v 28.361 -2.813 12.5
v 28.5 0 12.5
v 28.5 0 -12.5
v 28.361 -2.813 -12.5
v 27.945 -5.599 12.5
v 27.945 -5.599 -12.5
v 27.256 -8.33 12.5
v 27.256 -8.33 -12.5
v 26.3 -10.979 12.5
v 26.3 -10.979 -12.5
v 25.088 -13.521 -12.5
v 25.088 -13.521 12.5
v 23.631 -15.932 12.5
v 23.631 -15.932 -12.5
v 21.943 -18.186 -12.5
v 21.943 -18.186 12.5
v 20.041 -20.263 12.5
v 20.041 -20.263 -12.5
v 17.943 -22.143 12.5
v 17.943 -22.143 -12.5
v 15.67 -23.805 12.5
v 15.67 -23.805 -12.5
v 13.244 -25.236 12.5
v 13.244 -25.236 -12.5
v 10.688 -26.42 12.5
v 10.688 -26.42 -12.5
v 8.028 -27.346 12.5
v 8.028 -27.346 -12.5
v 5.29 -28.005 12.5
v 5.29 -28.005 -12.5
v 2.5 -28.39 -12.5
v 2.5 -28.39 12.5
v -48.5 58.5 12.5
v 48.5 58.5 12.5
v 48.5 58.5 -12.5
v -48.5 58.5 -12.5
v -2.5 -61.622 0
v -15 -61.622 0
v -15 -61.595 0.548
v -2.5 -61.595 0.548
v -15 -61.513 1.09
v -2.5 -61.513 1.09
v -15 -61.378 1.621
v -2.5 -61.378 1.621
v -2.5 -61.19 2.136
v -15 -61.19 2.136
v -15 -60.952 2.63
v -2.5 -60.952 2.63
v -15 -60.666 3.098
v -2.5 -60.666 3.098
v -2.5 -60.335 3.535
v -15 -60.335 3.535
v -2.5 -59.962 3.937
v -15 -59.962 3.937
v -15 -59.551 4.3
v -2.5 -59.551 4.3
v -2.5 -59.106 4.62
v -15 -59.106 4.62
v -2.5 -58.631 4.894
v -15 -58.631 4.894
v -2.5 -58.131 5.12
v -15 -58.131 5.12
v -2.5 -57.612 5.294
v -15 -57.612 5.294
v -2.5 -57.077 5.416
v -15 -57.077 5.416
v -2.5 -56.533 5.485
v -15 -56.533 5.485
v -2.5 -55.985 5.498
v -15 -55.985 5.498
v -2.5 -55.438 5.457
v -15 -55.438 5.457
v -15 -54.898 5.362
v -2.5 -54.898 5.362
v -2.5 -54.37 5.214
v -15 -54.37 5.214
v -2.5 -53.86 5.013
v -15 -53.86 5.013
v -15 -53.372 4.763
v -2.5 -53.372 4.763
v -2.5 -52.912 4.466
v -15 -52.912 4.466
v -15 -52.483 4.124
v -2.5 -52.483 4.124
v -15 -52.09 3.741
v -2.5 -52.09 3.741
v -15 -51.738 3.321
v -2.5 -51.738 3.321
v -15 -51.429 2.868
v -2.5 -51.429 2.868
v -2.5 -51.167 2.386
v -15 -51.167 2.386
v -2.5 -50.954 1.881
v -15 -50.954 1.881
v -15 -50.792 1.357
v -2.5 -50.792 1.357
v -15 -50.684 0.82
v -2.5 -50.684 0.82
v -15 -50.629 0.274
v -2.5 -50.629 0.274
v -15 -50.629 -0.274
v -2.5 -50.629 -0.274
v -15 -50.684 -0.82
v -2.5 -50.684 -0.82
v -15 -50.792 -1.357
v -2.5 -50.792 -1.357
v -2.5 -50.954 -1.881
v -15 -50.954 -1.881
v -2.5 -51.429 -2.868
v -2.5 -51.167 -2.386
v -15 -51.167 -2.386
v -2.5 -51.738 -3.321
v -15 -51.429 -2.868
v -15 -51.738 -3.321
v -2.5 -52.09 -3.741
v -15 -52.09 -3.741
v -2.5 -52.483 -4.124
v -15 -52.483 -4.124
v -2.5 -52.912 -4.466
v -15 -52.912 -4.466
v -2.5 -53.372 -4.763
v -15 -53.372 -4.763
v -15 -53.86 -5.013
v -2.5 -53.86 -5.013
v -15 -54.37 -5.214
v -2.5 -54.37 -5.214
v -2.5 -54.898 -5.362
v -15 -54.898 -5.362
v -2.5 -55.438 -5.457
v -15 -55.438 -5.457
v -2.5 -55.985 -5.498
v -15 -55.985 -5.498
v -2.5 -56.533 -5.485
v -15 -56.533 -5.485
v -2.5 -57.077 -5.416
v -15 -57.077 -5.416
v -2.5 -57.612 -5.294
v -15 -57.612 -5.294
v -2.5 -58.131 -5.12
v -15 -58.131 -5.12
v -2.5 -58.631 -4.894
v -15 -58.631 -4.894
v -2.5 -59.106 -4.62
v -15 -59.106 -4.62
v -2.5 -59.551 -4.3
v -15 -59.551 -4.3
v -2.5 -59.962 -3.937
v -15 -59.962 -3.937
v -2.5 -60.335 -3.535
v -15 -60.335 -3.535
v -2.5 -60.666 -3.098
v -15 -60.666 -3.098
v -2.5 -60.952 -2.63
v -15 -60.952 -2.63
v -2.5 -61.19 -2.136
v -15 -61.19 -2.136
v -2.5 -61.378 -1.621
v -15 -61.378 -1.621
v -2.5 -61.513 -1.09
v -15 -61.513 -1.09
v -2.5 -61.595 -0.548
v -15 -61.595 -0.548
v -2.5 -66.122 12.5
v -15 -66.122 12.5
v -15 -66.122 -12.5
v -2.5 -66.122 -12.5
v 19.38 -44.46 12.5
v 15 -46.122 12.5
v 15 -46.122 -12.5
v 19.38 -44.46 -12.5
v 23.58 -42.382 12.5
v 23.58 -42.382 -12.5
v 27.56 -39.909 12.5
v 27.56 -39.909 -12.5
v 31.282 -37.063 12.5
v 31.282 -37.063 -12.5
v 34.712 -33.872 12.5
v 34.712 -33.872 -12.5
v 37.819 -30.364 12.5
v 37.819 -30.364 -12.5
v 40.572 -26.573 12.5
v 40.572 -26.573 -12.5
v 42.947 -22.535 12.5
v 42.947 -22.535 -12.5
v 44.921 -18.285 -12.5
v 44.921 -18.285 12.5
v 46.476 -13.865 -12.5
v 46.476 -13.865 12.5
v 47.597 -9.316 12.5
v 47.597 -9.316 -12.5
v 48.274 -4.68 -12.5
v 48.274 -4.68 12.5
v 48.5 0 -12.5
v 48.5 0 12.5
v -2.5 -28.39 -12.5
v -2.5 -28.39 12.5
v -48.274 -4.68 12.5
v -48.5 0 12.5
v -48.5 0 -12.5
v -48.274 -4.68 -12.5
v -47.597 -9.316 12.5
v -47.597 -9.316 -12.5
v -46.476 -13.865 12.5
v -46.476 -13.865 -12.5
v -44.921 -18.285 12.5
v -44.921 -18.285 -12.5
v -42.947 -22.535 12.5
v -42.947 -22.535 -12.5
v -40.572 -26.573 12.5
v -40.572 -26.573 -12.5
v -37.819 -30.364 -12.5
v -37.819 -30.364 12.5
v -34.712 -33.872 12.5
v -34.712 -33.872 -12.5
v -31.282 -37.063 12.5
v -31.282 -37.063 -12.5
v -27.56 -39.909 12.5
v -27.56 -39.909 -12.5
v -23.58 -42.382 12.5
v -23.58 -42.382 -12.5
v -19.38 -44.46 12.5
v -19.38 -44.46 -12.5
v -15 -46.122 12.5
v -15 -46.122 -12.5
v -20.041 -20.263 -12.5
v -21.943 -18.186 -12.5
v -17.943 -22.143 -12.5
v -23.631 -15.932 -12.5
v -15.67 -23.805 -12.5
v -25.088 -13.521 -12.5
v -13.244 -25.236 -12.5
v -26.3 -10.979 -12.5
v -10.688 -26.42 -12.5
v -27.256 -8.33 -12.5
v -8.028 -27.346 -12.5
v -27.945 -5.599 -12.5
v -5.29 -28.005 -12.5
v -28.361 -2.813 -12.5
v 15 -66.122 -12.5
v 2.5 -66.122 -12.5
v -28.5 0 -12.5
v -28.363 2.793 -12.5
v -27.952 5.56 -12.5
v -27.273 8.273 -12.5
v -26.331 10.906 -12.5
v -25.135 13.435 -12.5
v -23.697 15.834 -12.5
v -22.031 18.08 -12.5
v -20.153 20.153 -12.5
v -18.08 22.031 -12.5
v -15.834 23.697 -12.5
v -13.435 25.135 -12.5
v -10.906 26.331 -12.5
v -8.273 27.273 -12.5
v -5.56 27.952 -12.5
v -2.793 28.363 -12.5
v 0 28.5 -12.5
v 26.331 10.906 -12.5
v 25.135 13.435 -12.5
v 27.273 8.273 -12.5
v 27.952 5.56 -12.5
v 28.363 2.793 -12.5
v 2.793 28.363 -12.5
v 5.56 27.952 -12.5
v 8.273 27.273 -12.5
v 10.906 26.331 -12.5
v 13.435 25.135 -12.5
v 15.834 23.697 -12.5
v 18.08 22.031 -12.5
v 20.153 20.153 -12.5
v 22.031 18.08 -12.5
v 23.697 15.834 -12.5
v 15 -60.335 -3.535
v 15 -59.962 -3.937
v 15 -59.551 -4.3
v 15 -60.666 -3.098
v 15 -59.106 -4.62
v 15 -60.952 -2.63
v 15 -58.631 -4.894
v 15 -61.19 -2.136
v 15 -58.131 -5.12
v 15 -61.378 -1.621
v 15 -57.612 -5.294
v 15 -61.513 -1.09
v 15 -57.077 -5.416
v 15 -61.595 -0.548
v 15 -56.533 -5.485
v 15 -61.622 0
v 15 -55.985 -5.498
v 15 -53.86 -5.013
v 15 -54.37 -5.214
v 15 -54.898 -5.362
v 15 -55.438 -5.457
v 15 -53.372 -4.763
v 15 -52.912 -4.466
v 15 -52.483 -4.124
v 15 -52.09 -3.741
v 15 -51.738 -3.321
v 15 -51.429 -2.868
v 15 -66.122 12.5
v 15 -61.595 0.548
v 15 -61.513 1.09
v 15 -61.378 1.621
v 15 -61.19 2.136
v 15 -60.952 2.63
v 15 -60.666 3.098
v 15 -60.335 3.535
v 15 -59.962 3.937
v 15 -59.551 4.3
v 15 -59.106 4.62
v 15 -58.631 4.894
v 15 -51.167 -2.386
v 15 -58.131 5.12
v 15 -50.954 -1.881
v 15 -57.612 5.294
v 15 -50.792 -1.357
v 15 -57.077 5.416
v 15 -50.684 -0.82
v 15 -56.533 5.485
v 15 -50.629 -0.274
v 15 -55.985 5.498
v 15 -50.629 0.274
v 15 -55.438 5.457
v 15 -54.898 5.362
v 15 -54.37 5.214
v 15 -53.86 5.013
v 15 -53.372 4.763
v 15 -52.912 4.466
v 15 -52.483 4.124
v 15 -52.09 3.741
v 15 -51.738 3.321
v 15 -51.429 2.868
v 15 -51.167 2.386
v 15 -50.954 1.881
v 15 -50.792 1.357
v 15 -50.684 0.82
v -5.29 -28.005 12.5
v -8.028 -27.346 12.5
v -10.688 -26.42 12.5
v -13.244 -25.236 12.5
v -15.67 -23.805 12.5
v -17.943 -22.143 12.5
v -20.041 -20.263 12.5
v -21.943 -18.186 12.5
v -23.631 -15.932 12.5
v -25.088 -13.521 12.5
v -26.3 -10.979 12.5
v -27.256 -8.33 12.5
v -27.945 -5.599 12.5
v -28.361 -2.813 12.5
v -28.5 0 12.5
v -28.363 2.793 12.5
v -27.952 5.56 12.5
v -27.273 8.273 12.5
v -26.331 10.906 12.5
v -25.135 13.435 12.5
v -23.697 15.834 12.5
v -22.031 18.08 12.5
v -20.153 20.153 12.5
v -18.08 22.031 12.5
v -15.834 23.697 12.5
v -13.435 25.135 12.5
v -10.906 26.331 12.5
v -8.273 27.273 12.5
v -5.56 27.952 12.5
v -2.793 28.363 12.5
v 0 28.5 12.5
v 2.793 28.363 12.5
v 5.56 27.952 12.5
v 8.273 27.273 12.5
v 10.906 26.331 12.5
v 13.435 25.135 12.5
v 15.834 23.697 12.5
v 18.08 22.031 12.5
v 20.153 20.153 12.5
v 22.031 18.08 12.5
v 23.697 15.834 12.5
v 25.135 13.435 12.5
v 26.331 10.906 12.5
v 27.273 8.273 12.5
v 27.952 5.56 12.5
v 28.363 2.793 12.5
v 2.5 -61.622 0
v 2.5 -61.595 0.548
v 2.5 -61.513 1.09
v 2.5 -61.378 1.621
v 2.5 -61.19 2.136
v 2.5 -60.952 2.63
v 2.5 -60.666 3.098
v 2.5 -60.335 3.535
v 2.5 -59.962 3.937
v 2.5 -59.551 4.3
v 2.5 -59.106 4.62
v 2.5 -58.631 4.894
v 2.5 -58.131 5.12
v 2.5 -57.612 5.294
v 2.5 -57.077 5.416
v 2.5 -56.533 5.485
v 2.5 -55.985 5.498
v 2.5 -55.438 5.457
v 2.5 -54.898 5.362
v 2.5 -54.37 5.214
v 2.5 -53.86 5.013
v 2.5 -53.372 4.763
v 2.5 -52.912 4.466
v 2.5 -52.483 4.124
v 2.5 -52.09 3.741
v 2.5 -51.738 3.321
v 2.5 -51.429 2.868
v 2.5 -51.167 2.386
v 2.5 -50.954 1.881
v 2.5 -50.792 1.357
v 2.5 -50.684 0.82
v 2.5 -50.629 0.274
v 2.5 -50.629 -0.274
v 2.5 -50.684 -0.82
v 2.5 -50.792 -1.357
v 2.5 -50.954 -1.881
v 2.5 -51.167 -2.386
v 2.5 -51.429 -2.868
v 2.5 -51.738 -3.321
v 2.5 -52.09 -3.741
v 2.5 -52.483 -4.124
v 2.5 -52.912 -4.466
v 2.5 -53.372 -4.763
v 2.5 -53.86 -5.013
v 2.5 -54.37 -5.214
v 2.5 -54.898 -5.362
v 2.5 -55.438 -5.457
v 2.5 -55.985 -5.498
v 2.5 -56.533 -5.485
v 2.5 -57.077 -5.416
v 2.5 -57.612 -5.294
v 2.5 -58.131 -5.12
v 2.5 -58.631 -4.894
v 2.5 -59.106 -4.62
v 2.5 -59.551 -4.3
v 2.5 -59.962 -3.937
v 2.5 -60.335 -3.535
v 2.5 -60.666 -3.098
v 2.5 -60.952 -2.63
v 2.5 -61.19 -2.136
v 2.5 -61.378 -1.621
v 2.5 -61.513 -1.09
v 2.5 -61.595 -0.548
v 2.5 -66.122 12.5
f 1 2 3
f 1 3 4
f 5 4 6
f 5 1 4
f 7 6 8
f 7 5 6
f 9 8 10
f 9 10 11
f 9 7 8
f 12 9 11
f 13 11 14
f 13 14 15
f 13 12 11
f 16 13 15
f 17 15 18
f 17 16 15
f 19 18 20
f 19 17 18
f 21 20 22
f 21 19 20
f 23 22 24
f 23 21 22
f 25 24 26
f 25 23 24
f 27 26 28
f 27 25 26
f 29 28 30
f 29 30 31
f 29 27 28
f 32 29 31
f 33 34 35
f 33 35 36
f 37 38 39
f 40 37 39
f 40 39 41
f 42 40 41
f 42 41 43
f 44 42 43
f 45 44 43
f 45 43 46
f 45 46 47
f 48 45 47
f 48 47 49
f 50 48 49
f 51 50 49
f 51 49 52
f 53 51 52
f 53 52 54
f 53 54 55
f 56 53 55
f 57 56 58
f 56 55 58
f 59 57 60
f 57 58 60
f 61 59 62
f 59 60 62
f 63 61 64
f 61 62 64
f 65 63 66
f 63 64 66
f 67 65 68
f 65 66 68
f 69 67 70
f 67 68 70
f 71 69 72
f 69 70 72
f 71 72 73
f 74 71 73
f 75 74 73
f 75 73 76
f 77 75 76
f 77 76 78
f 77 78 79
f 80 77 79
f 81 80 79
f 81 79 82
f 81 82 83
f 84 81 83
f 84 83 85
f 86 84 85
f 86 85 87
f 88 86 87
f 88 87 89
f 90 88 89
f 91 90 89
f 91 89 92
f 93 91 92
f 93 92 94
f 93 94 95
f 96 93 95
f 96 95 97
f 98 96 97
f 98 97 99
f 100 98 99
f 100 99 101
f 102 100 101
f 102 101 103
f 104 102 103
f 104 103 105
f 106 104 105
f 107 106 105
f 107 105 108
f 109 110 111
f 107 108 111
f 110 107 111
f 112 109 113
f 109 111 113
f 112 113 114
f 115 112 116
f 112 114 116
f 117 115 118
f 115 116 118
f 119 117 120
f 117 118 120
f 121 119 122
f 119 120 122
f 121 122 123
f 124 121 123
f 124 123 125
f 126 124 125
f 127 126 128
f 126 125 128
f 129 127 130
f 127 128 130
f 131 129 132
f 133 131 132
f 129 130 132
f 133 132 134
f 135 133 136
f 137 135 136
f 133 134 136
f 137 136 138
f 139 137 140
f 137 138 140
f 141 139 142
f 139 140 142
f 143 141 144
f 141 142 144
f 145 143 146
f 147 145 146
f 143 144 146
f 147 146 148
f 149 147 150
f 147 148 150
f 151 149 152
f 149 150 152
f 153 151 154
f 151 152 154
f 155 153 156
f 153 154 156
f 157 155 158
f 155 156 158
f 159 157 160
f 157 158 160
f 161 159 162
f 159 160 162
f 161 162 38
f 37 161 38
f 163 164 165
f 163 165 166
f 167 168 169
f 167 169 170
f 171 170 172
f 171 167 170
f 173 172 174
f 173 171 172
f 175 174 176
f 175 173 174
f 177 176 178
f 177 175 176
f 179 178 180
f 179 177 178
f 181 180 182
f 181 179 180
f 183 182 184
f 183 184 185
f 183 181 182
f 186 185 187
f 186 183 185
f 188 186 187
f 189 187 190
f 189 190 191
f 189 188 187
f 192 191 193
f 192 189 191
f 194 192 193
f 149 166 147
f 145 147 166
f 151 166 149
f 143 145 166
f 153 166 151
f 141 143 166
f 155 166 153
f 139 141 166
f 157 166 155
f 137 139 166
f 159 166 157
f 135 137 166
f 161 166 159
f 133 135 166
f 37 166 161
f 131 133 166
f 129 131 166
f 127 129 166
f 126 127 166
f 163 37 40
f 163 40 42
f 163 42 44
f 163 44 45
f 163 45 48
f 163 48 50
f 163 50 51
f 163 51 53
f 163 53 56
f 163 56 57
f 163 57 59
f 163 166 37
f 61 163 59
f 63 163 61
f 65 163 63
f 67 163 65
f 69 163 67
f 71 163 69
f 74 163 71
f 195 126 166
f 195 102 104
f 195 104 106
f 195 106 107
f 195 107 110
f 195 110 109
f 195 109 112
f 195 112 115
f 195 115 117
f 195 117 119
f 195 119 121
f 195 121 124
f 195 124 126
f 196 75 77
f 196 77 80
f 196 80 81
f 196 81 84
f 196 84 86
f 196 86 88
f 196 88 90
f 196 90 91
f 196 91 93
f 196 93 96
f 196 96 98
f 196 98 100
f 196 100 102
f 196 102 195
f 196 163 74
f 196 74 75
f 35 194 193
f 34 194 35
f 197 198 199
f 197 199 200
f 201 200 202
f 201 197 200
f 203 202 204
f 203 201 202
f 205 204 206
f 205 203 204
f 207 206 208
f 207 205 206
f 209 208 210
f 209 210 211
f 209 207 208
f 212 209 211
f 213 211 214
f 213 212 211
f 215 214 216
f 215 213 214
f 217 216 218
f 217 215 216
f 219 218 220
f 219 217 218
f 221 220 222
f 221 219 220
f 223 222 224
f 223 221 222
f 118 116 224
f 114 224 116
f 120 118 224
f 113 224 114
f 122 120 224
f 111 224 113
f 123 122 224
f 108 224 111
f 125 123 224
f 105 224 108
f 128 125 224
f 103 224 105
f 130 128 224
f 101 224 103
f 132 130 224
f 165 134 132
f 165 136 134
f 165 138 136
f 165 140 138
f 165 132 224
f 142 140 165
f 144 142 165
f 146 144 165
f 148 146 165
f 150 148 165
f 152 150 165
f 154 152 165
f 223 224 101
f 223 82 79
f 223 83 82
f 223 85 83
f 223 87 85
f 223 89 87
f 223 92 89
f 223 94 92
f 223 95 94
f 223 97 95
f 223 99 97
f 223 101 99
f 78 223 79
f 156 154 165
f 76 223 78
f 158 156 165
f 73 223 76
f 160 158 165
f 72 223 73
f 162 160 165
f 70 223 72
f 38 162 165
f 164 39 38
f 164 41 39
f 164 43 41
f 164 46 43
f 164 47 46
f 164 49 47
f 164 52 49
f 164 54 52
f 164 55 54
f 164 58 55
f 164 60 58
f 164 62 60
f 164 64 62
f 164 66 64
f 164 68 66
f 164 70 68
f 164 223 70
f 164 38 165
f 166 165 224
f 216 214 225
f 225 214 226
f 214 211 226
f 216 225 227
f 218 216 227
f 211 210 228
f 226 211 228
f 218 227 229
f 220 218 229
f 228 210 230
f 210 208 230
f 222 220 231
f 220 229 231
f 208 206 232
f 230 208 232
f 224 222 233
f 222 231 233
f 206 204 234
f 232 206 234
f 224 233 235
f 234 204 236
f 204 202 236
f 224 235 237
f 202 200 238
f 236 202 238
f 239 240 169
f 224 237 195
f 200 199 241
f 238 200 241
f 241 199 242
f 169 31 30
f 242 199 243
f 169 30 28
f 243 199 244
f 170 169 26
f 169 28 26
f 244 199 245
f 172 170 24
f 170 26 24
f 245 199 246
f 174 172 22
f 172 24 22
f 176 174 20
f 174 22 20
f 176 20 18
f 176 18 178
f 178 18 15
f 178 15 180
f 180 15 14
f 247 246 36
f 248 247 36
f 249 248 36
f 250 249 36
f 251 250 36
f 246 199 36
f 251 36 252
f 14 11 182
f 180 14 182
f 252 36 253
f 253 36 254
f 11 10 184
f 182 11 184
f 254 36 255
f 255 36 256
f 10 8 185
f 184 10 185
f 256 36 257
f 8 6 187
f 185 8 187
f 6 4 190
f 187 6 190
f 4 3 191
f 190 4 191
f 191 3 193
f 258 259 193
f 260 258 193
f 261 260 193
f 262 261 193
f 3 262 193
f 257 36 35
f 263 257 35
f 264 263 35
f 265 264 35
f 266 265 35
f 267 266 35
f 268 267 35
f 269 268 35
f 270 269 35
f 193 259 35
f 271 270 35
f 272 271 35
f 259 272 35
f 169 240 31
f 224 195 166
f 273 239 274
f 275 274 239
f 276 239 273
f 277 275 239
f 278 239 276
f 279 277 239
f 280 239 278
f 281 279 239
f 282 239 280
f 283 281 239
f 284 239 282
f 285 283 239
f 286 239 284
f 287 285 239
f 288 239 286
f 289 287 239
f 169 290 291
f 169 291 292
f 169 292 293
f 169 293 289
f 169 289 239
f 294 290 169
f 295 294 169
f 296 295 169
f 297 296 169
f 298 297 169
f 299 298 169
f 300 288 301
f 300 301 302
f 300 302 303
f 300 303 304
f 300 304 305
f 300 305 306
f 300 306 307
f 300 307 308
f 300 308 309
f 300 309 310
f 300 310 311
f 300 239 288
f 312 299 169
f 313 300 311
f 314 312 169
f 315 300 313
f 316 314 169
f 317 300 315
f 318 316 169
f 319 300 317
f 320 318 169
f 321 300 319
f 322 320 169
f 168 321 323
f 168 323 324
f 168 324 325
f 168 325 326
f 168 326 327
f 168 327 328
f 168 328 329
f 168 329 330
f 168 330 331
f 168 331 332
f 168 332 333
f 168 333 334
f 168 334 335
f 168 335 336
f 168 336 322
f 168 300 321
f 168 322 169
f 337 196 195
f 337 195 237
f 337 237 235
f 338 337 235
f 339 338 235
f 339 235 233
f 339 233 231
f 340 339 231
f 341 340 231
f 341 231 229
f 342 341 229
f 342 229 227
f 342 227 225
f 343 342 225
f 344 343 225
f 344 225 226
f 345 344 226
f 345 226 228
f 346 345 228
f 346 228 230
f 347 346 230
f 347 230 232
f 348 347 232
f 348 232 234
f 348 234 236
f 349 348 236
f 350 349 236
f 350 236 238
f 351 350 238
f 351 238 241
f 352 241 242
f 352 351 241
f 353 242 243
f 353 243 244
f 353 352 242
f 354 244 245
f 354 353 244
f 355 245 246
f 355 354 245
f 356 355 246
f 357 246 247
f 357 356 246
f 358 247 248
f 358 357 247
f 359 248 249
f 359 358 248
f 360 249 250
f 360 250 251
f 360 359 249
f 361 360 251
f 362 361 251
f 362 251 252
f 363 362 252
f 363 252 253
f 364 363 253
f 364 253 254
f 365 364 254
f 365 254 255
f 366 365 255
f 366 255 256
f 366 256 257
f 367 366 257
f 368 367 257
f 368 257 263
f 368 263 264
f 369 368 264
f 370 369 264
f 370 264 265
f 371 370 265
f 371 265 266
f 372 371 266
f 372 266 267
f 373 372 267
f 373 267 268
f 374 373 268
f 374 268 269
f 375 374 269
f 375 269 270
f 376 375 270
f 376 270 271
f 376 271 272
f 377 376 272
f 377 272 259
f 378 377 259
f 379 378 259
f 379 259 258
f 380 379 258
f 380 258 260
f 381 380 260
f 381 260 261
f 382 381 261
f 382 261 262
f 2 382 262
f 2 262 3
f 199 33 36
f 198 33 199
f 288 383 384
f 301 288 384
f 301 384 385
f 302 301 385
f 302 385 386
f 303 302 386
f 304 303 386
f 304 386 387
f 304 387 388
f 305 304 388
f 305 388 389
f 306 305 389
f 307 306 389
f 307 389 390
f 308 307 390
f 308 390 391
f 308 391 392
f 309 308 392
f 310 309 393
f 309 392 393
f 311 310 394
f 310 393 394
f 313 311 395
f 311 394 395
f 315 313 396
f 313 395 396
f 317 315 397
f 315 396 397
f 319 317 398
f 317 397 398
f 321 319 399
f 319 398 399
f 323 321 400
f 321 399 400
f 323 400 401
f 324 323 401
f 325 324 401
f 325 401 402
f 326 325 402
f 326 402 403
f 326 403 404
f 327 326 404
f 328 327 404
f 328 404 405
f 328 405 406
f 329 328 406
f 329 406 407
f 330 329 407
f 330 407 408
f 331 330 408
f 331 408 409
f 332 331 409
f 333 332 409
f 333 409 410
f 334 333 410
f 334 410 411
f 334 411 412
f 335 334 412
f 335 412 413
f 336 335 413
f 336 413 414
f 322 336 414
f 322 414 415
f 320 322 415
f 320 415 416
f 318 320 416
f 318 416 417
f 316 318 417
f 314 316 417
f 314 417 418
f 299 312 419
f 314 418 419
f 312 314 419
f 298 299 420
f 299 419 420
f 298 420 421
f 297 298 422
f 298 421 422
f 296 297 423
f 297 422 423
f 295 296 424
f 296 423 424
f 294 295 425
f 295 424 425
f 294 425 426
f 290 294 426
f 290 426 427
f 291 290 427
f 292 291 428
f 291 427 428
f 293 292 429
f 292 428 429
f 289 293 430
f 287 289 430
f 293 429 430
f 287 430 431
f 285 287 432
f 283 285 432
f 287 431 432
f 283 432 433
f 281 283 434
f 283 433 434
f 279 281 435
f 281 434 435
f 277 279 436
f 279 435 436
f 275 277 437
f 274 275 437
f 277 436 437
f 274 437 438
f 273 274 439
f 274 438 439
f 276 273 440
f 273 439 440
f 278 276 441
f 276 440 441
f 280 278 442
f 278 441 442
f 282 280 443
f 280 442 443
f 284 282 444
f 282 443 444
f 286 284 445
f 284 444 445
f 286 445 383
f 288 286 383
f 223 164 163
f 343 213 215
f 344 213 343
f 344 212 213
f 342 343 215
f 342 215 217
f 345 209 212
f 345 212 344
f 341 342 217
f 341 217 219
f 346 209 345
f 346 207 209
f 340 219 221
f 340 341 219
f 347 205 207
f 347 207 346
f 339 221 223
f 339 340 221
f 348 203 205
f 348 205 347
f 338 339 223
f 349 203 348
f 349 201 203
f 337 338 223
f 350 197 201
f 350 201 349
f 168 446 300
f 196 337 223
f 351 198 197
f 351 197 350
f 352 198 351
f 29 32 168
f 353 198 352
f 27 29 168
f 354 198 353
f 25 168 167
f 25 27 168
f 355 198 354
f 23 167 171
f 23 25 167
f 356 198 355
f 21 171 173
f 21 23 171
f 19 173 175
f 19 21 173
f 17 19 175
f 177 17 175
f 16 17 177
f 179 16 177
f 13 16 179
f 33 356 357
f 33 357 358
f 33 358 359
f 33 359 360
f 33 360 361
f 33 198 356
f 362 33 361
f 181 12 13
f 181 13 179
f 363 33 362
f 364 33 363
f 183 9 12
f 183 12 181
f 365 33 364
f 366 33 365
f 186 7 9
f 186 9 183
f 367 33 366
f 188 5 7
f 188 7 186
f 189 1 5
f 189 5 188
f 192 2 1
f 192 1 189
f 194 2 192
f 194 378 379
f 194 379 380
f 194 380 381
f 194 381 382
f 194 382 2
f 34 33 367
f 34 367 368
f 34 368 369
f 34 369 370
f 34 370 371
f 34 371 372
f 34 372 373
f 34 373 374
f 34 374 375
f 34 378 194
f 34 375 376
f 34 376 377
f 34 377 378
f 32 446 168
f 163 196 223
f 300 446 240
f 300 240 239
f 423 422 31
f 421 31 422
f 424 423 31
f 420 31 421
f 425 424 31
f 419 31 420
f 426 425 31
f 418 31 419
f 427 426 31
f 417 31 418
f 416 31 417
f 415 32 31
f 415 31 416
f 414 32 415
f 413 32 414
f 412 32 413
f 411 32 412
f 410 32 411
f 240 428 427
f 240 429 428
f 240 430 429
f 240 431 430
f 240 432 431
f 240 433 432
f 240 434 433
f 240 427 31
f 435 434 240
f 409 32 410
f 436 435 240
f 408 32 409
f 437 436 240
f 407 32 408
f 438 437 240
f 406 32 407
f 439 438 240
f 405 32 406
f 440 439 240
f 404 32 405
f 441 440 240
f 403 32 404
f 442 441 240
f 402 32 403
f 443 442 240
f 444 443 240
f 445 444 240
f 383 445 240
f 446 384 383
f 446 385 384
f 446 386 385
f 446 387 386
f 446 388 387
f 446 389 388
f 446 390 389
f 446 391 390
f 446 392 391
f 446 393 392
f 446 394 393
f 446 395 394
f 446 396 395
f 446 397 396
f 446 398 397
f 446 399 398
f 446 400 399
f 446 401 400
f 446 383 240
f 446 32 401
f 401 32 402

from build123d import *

# Parameters (mm, degrees)
F1_DEPTH = 12.5
F3_D     = 11


with BuildPart() as f1:
    # F0 (on Top) → F1 (new body, symmetric)
    with BuildSketch(Plane.XY):
        with BuildLine():
            ThreePointArc((28.5, 0), (21.017849557, -19.2483765549), (2.5, -28.3901391332))
            Line((2.5, -28.3901391332), (2.5, -66.1221205063))
            Line((2.5, -66.1221205063), (15, -66.1221205063))
            Line((15, -66.1221205063), (15, -46.1221205063))
            ThreePointArc((15, -46.1221205063), (39.2412410609, -28.5021928981), (48.5, 0))
            Line((48.5, 0), (28.5, 0))
        make_face()
        with BuildLine():
            ThreePointArc((-28.5, 0), (0, 28.5), (28.5, 0))
            Line((28.5, 0), (48.5, 0))
            ThreePointArc((48.5, 0), (0, 48.5), (-48.5, 0))
            Line((-48.5, 0), (-28.5, 0))
        make_face()
        with BuildLine():
            ThreePointArc((-2.5, -28.3901391332), (-21.017849557, -19.2483765549), (-28.5, 0))
            Line((-28.5, 0), (-48.5, 0))
            ThreePointArc((-48.5, 0), (-39.2412410609, -28.5021928981), (-15, -46.1221205063))
            Line((-15, -46.1221205063), (-15, -66.1221205063))
            Line((-15, -66.1221205063), (-2.5, -66.1221205063))
            Line((-2.5, -66.1221205063), (-2.5, -28.3901391332))
        make_face()
        with BuildLine():
            ThreePointArc((-48.5, 0), (0, 48.5), (48.5, 0))
            Line((48.5, 0), (48.5, 58.5))
            Line((48.5, 58.5), (-48.5, 58.5))
            Line((-48.5, 58.5), (-48.5, 0))
        make_face()
    extrude(amount=F1_DEPTH, both=True)

    # F3 (through all)
    with Locations(Plane.YZ.offset(15)):
        with Locations((-56.1221205063, 0)):
            Hole(F3_D / 2)


solid = f1.part
